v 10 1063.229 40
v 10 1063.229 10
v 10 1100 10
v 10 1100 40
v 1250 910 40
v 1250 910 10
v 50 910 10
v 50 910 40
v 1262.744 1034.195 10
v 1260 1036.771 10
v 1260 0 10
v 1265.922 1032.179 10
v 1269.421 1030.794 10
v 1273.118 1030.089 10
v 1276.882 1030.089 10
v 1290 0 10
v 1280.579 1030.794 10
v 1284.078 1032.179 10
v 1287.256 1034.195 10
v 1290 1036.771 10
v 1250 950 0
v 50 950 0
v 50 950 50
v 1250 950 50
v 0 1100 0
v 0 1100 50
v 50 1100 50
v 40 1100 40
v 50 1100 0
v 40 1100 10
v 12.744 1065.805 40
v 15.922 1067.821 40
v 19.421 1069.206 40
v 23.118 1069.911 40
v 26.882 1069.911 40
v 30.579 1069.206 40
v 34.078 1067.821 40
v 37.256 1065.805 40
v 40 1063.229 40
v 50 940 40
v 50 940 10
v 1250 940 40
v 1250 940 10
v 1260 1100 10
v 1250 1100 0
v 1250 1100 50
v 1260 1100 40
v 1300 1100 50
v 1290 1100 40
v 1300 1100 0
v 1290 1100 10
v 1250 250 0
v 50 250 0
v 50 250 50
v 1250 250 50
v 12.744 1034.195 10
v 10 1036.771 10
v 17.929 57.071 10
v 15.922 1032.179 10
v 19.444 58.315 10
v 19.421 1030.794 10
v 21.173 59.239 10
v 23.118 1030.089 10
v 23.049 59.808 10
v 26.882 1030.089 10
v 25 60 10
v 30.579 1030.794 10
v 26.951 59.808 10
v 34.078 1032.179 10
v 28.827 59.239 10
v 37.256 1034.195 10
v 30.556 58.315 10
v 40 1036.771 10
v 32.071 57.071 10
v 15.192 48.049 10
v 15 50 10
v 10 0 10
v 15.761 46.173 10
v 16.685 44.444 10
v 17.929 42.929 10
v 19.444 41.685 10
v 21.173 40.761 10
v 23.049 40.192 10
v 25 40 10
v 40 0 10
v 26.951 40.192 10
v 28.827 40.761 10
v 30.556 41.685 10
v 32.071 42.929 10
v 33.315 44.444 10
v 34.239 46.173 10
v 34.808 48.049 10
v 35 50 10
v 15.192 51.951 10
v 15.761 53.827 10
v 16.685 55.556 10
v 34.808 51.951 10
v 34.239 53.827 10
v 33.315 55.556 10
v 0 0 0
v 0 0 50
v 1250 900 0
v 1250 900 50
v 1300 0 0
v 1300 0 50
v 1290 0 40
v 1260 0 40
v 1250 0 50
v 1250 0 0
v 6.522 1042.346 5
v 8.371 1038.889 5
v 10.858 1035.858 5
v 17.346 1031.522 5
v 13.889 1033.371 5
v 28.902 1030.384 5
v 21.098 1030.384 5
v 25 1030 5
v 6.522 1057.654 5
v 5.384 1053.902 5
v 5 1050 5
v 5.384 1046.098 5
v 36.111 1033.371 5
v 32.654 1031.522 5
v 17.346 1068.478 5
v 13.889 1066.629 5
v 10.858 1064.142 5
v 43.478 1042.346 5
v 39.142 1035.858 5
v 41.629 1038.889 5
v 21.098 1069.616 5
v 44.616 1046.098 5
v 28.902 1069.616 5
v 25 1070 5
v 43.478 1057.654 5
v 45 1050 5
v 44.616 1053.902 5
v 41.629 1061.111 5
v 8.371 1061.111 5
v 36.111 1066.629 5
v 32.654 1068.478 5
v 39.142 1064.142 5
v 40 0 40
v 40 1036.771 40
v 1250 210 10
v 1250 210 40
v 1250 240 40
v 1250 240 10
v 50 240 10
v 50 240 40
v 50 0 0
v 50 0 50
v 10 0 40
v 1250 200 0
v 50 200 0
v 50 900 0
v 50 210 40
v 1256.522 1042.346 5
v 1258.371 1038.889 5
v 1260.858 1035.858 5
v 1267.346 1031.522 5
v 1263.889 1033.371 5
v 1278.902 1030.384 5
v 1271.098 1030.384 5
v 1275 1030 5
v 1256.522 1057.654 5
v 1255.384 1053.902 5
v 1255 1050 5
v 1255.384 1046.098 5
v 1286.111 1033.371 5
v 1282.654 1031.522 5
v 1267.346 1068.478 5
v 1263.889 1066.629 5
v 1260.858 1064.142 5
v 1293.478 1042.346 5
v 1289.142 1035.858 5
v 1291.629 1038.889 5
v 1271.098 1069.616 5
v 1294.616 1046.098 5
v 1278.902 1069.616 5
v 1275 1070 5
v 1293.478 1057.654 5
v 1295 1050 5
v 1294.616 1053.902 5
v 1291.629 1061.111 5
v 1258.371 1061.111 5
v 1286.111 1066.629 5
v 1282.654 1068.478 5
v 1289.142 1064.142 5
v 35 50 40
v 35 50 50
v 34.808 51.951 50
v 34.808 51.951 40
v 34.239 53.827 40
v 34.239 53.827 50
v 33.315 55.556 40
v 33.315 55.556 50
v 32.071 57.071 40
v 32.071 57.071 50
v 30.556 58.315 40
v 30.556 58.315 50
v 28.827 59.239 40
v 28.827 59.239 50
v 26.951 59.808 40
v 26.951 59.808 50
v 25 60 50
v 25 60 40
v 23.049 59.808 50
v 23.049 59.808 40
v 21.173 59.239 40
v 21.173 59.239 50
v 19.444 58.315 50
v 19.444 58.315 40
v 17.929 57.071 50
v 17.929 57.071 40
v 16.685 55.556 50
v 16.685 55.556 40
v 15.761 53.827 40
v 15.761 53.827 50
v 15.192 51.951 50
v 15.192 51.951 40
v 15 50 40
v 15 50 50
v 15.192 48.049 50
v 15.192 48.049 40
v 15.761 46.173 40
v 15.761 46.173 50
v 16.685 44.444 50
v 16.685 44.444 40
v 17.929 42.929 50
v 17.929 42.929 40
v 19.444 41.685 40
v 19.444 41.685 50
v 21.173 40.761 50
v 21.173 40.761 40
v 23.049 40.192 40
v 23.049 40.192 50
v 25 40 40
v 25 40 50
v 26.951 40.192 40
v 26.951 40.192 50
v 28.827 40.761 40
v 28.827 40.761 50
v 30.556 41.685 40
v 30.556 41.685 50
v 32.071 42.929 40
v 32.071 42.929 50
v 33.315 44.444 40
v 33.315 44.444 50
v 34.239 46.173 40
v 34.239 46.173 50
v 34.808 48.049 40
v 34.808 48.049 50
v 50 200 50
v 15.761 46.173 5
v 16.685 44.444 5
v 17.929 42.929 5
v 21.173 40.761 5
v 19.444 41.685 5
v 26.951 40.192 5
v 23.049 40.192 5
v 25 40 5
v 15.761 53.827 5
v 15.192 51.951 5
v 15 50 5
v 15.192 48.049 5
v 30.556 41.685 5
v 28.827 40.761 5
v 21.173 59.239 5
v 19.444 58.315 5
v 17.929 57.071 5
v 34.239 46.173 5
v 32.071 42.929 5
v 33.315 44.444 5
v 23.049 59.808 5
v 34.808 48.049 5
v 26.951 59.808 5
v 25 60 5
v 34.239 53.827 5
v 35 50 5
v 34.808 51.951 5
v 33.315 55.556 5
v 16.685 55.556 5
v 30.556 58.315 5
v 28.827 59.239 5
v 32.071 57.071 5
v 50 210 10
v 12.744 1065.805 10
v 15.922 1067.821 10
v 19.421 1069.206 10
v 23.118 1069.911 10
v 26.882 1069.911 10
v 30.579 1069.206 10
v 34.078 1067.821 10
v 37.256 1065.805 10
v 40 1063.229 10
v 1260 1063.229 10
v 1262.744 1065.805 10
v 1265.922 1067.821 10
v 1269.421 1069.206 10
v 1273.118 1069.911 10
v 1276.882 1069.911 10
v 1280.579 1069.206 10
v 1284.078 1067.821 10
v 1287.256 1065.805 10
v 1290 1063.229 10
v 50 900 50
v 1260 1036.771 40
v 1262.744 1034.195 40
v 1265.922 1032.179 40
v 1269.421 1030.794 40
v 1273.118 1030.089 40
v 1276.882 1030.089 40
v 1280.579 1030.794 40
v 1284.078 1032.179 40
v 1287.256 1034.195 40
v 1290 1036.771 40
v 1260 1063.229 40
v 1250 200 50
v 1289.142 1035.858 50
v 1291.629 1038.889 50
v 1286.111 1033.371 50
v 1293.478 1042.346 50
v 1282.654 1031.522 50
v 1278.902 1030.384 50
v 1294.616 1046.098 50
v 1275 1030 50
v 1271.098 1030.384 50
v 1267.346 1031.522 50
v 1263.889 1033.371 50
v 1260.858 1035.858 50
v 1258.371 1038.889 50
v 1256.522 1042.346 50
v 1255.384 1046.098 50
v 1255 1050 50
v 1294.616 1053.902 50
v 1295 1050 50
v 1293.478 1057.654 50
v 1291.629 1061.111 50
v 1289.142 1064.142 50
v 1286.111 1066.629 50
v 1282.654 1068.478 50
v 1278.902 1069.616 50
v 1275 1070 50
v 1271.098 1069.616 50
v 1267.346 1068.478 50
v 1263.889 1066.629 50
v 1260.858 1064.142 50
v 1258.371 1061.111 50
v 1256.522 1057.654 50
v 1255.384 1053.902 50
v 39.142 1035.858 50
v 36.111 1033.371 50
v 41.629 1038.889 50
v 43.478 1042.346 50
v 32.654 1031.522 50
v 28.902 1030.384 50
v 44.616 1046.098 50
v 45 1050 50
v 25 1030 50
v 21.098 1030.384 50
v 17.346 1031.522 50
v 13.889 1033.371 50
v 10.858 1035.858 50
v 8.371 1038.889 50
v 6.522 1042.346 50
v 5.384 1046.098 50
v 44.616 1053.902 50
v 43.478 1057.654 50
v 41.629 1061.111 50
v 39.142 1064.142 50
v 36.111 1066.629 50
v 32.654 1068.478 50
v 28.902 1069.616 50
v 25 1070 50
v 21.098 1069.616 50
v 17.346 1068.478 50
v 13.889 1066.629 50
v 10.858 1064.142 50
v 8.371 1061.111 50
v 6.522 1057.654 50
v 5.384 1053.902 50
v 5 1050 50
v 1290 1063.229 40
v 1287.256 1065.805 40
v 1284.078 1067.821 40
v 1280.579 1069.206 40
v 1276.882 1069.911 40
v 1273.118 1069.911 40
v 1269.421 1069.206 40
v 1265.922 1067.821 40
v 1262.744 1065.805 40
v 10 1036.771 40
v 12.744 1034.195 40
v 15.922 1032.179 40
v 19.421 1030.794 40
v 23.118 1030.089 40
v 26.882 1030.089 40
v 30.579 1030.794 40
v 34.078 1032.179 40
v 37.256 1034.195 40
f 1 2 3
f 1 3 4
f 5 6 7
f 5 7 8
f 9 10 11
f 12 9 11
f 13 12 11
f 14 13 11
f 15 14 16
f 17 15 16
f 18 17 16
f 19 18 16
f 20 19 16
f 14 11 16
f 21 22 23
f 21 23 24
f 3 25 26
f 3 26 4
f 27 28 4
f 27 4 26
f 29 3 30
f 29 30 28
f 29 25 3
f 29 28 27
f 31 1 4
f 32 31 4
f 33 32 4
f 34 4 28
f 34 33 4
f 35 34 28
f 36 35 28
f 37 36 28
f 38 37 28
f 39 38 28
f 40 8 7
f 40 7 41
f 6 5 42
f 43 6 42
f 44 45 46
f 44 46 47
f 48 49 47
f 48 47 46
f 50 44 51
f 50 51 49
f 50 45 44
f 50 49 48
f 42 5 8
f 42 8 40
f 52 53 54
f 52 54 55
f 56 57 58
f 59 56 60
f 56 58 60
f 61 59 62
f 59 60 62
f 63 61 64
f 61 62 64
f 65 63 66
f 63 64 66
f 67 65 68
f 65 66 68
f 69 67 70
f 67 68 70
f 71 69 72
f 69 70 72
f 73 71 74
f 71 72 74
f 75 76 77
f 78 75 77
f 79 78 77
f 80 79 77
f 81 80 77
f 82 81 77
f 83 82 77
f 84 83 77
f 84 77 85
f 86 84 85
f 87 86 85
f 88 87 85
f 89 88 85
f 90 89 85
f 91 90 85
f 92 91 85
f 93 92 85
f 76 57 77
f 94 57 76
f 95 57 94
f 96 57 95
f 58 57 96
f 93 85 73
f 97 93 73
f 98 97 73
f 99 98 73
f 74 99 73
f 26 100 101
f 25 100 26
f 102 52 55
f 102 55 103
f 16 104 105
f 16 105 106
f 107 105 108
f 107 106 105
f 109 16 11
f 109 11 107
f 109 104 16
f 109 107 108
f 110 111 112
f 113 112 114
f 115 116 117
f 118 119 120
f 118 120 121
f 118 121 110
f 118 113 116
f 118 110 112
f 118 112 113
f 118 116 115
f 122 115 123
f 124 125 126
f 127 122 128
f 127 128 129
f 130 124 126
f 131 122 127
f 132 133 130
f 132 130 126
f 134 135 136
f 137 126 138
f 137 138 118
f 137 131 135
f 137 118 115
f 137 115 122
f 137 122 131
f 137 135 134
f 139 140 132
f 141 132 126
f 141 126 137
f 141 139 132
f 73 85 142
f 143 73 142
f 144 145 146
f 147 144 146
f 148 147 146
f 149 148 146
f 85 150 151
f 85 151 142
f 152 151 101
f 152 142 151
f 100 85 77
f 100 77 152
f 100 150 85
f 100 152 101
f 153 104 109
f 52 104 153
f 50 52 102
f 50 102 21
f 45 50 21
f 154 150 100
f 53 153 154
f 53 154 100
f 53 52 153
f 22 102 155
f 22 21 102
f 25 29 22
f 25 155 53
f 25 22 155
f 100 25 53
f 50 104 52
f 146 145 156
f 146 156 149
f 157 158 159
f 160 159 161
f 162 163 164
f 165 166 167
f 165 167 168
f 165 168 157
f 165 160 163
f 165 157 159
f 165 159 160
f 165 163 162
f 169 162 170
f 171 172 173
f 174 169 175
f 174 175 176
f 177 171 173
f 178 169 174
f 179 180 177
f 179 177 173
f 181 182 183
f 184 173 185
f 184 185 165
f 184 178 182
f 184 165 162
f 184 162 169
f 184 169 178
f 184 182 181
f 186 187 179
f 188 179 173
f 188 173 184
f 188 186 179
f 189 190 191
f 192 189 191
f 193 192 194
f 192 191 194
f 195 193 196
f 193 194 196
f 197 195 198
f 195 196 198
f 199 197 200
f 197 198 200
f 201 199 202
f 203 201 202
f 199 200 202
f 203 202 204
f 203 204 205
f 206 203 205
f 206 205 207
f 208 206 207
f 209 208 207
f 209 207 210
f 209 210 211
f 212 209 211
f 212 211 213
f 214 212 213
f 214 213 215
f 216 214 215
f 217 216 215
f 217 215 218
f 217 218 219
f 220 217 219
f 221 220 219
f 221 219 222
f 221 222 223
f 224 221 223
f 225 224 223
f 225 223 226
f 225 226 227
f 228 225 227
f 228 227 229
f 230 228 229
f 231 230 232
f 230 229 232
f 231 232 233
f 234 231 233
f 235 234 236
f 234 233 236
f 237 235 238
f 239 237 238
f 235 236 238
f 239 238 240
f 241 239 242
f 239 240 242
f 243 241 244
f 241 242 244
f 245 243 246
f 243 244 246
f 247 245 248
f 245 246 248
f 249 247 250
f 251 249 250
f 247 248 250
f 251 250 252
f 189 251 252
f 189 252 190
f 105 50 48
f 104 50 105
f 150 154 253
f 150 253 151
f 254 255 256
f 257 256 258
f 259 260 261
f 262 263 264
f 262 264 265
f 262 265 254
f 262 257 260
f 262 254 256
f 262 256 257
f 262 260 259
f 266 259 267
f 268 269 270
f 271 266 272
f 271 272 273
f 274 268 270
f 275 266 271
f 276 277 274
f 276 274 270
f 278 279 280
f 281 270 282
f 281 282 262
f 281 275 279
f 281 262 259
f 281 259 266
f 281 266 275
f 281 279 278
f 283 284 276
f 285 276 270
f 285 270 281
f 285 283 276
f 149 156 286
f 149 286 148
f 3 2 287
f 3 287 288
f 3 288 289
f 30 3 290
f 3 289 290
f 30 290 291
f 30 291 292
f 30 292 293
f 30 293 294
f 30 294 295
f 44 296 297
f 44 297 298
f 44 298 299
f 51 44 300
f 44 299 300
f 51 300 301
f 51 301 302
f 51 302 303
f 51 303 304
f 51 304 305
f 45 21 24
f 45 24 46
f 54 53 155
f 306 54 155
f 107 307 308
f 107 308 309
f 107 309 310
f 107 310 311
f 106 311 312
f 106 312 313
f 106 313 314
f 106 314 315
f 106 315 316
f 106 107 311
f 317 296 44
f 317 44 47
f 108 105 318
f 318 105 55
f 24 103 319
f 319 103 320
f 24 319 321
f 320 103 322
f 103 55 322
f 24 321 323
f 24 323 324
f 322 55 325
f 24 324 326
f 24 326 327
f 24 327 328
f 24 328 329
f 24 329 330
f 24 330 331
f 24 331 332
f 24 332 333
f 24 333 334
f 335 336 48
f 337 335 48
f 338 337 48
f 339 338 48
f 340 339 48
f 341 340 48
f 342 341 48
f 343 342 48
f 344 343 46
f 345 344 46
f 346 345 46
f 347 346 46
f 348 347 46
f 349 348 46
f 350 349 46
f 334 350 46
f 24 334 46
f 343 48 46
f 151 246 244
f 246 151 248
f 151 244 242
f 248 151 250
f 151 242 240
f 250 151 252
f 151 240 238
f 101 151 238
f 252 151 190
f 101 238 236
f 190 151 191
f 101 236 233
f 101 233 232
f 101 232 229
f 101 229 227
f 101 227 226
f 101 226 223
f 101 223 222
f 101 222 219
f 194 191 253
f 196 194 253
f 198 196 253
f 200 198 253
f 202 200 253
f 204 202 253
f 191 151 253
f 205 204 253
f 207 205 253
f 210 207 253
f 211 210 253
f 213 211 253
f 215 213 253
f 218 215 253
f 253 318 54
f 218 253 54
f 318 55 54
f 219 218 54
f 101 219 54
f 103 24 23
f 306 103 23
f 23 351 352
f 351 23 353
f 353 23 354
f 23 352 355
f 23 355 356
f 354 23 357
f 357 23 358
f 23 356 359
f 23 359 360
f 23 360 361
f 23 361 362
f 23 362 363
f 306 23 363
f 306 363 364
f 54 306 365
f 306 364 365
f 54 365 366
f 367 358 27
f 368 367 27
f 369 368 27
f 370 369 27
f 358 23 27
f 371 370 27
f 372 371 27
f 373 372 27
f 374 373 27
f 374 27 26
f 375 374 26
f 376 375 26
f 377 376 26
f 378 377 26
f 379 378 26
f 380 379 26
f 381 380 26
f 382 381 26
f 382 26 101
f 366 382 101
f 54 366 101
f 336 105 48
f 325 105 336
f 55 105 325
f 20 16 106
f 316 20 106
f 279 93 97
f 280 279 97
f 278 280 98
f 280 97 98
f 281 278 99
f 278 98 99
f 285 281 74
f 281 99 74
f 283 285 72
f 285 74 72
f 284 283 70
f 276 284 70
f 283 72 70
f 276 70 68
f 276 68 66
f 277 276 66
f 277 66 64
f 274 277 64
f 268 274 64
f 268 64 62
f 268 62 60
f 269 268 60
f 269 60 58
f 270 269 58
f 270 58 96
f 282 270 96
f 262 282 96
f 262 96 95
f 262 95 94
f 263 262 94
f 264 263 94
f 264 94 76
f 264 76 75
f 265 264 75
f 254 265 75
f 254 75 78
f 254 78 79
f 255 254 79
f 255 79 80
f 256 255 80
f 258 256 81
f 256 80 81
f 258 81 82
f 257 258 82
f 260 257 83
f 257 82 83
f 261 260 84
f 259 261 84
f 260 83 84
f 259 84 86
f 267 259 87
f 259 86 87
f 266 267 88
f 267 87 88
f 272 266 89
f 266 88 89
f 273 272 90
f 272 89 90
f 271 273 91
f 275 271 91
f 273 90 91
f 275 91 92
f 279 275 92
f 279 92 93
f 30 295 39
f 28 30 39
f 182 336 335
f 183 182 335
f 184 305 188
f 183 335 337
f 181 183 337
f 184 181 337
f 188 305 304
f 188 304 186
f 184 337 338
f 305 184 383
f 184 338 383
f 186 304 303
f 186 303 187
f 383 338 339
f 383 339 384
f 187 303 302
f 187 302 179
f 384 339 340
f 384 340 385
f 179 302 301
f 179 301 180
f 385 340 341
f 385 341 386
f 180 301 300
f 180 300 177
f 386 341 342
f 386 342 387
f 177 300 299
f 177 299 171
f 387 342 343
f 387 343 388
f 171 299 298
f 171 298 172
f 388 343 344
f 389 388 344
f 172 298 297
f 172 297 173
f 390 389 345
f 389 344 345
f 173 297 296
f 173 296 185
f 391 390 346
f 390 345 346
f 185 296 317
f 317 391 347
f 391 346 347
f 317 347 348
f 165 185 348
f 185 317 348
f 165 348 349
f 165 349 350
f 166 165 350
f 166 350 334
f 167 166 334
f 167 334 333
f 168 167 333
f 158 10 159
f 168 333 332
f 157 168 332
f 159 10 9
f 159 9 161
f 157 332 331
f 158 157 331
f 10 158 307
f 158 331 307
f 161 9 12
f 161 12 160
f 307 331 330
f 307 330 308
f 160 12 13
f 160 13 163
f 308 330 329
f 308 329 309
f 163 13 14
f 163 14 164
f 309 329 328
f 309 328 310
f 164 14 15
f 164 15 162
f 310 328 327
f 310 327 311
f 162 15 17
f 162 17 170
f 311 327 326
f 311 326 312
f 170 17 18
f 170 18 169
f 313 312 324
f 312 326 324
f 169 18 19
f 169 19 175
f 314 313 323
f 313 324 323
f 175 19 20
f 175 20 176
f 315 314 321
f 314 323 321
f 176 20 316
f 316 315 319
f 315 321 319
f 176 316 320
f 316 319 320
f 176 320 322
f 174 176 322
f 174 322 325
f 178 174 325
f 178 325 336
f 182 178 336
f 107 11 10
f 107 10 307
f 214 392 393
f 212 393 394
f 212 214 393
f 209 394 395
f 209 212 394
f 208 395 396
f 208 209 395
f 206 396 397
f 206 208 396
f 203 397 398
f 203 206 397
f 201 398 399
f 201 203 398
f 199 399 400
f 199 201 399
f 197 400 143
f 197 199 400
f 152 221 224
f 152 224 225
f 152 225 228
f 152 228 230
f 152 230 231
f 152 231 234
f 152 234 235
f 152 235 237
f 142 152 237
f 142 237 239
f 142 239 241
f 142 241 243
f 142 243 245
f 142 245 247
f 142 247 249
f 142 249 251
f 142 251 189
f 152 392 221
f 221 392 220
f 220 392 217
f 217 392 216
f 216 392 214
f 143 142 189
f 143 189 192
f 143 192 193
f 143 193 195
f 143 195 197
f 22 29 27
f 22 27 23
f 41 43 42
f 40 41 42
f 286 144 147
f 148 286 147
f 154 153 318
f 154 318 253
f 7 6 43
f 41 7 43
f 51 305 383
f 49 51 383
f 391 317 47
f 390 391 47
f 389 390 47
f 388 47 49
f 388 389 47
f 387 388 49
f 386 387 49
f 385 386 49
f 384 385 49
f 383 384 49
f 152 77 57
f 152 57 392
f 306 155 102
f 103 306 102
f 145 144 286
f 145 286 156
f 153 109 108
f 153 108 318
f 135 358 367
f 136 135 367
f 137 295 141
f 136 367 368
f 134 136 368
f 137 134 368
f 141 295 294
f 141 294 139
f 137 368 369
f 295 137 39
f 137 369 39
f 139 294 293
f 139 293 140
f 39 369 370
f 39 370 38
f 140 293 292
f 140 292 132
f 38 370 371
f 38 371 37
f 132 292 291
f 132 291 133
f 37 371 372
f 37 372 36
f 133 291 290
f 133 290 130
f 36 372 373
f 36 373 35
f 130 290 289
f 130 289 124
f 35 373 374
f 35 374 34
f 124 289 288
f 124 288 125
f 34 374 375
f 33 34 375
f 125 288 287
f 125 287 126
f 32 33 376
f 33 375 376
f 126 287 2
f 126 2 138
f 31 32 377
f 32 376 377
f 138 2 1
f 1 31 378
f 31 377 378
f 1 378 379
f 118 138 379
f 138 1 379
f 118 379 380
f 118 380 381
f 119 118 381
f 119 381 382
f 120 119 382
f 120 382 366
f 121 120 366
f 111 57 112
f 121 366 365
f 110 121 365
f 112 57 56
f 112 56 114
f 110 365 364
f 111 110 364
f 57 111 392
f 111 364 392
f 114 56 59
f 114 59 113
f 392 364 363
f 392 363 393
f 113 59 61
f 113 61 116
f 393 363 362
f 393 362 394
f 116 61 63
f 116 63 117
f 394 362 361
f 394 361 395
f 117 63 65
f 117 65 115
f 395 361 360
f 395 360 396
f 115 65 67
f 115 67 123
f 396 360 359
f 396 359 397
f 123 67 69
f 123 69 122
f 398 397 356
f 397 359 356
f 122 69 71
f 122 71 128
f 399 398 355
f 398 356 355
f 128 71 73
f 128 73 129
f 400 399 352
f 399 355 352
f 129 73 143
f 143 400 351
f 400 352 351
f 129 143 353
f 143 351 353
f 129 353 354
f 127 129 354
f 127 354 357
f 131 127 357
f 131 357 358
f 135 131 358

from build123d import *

# Parameters (mm, degrees)
SKETCH_W        = 1200
SKETCH_H        = 650
PAD_DEPTH       = 50
SKETCH001_W     = 30
SKETCH001_H     = 30
POCKET_DEPTH    = 1100
SKETCH002_W     = 30
SKETCH002_H     = 30
POCKET001_DEPTH = 1200
SKETCH003_R     = 20
POCKET002_DEPTH = 45
SKETCH004_R     = 10
POCKET003_DEPTH = 45


with BuildPart() as part:
    # Sketch → Pad (new body)
    with BuildSketch(Plane.XY):
        Polygon((0, 0), (0, 1100), (50, 1100), (50, 950), (1250, 950), (1250, 1100), (1300, 1100), (1300, 0), (1250, 0), (1250, 200), (50, 200), (50, 0), align=None)
        with Locations((650, 575)):
            Rectangle(SKETCH_W, SKETCH_H, mode=Mode.SUBTRACT)
    extrude(amount=PAD_DEPTH)

    # Sketch001 (on Face2 of Pad) → Pocket (cut)
    with BuildSketch(Plane.XZ):
        with Locations((25, 25)):
            Rectangle(SKETCH001_W, SKETCH001_H)
        with Locations((1275, 25)):
            Rectangle(SKETCH001_W, SKETCH001_H)
    extrude(amount=-POCKET_DEPTH, mode=Mode.SUBTRACT)

    # Sketch002 (on Face19 of Pocket) → Pocket001 (cut)
    with BuildSketch(Plane.YZ.offset(50)):
        with Locations((225, 25)):
            Rectangle(SKETCH002_W, SKETCH002_H)
        with Locations((925, 25)):
            Rectangle(SKETCH002_W, SKETCH002_H)
    extrude(amount=POCKET001_DEPTH, mode=Mode.SUBTRACT)

    # Sketch003 (on Face5 of Pocket001) → Pocket002 (cut)
    with BuildSketch(Plane.XY.offset(50)):
        with Locations((25, 1050)):
            Circle(SKETCH003_R)
        with Locations((1275, 1050)):
            Circle(SKETCH003_R)
    extrude(amount=-POCKET002_DEPTH, mode=Mode.SUBTRACT)

    # Sketch004 (on Face5 of Pocket002) → Pocket003 (cut)
    with BuildSketch(Plane.XY.offset(50)):
        with Locations((25, 50)):
            Circle(SKETCH004_R)
    extrude(amount=-POCKET003_DEPTH, mode=Mode.SUBTRACT)


solid = part.part
